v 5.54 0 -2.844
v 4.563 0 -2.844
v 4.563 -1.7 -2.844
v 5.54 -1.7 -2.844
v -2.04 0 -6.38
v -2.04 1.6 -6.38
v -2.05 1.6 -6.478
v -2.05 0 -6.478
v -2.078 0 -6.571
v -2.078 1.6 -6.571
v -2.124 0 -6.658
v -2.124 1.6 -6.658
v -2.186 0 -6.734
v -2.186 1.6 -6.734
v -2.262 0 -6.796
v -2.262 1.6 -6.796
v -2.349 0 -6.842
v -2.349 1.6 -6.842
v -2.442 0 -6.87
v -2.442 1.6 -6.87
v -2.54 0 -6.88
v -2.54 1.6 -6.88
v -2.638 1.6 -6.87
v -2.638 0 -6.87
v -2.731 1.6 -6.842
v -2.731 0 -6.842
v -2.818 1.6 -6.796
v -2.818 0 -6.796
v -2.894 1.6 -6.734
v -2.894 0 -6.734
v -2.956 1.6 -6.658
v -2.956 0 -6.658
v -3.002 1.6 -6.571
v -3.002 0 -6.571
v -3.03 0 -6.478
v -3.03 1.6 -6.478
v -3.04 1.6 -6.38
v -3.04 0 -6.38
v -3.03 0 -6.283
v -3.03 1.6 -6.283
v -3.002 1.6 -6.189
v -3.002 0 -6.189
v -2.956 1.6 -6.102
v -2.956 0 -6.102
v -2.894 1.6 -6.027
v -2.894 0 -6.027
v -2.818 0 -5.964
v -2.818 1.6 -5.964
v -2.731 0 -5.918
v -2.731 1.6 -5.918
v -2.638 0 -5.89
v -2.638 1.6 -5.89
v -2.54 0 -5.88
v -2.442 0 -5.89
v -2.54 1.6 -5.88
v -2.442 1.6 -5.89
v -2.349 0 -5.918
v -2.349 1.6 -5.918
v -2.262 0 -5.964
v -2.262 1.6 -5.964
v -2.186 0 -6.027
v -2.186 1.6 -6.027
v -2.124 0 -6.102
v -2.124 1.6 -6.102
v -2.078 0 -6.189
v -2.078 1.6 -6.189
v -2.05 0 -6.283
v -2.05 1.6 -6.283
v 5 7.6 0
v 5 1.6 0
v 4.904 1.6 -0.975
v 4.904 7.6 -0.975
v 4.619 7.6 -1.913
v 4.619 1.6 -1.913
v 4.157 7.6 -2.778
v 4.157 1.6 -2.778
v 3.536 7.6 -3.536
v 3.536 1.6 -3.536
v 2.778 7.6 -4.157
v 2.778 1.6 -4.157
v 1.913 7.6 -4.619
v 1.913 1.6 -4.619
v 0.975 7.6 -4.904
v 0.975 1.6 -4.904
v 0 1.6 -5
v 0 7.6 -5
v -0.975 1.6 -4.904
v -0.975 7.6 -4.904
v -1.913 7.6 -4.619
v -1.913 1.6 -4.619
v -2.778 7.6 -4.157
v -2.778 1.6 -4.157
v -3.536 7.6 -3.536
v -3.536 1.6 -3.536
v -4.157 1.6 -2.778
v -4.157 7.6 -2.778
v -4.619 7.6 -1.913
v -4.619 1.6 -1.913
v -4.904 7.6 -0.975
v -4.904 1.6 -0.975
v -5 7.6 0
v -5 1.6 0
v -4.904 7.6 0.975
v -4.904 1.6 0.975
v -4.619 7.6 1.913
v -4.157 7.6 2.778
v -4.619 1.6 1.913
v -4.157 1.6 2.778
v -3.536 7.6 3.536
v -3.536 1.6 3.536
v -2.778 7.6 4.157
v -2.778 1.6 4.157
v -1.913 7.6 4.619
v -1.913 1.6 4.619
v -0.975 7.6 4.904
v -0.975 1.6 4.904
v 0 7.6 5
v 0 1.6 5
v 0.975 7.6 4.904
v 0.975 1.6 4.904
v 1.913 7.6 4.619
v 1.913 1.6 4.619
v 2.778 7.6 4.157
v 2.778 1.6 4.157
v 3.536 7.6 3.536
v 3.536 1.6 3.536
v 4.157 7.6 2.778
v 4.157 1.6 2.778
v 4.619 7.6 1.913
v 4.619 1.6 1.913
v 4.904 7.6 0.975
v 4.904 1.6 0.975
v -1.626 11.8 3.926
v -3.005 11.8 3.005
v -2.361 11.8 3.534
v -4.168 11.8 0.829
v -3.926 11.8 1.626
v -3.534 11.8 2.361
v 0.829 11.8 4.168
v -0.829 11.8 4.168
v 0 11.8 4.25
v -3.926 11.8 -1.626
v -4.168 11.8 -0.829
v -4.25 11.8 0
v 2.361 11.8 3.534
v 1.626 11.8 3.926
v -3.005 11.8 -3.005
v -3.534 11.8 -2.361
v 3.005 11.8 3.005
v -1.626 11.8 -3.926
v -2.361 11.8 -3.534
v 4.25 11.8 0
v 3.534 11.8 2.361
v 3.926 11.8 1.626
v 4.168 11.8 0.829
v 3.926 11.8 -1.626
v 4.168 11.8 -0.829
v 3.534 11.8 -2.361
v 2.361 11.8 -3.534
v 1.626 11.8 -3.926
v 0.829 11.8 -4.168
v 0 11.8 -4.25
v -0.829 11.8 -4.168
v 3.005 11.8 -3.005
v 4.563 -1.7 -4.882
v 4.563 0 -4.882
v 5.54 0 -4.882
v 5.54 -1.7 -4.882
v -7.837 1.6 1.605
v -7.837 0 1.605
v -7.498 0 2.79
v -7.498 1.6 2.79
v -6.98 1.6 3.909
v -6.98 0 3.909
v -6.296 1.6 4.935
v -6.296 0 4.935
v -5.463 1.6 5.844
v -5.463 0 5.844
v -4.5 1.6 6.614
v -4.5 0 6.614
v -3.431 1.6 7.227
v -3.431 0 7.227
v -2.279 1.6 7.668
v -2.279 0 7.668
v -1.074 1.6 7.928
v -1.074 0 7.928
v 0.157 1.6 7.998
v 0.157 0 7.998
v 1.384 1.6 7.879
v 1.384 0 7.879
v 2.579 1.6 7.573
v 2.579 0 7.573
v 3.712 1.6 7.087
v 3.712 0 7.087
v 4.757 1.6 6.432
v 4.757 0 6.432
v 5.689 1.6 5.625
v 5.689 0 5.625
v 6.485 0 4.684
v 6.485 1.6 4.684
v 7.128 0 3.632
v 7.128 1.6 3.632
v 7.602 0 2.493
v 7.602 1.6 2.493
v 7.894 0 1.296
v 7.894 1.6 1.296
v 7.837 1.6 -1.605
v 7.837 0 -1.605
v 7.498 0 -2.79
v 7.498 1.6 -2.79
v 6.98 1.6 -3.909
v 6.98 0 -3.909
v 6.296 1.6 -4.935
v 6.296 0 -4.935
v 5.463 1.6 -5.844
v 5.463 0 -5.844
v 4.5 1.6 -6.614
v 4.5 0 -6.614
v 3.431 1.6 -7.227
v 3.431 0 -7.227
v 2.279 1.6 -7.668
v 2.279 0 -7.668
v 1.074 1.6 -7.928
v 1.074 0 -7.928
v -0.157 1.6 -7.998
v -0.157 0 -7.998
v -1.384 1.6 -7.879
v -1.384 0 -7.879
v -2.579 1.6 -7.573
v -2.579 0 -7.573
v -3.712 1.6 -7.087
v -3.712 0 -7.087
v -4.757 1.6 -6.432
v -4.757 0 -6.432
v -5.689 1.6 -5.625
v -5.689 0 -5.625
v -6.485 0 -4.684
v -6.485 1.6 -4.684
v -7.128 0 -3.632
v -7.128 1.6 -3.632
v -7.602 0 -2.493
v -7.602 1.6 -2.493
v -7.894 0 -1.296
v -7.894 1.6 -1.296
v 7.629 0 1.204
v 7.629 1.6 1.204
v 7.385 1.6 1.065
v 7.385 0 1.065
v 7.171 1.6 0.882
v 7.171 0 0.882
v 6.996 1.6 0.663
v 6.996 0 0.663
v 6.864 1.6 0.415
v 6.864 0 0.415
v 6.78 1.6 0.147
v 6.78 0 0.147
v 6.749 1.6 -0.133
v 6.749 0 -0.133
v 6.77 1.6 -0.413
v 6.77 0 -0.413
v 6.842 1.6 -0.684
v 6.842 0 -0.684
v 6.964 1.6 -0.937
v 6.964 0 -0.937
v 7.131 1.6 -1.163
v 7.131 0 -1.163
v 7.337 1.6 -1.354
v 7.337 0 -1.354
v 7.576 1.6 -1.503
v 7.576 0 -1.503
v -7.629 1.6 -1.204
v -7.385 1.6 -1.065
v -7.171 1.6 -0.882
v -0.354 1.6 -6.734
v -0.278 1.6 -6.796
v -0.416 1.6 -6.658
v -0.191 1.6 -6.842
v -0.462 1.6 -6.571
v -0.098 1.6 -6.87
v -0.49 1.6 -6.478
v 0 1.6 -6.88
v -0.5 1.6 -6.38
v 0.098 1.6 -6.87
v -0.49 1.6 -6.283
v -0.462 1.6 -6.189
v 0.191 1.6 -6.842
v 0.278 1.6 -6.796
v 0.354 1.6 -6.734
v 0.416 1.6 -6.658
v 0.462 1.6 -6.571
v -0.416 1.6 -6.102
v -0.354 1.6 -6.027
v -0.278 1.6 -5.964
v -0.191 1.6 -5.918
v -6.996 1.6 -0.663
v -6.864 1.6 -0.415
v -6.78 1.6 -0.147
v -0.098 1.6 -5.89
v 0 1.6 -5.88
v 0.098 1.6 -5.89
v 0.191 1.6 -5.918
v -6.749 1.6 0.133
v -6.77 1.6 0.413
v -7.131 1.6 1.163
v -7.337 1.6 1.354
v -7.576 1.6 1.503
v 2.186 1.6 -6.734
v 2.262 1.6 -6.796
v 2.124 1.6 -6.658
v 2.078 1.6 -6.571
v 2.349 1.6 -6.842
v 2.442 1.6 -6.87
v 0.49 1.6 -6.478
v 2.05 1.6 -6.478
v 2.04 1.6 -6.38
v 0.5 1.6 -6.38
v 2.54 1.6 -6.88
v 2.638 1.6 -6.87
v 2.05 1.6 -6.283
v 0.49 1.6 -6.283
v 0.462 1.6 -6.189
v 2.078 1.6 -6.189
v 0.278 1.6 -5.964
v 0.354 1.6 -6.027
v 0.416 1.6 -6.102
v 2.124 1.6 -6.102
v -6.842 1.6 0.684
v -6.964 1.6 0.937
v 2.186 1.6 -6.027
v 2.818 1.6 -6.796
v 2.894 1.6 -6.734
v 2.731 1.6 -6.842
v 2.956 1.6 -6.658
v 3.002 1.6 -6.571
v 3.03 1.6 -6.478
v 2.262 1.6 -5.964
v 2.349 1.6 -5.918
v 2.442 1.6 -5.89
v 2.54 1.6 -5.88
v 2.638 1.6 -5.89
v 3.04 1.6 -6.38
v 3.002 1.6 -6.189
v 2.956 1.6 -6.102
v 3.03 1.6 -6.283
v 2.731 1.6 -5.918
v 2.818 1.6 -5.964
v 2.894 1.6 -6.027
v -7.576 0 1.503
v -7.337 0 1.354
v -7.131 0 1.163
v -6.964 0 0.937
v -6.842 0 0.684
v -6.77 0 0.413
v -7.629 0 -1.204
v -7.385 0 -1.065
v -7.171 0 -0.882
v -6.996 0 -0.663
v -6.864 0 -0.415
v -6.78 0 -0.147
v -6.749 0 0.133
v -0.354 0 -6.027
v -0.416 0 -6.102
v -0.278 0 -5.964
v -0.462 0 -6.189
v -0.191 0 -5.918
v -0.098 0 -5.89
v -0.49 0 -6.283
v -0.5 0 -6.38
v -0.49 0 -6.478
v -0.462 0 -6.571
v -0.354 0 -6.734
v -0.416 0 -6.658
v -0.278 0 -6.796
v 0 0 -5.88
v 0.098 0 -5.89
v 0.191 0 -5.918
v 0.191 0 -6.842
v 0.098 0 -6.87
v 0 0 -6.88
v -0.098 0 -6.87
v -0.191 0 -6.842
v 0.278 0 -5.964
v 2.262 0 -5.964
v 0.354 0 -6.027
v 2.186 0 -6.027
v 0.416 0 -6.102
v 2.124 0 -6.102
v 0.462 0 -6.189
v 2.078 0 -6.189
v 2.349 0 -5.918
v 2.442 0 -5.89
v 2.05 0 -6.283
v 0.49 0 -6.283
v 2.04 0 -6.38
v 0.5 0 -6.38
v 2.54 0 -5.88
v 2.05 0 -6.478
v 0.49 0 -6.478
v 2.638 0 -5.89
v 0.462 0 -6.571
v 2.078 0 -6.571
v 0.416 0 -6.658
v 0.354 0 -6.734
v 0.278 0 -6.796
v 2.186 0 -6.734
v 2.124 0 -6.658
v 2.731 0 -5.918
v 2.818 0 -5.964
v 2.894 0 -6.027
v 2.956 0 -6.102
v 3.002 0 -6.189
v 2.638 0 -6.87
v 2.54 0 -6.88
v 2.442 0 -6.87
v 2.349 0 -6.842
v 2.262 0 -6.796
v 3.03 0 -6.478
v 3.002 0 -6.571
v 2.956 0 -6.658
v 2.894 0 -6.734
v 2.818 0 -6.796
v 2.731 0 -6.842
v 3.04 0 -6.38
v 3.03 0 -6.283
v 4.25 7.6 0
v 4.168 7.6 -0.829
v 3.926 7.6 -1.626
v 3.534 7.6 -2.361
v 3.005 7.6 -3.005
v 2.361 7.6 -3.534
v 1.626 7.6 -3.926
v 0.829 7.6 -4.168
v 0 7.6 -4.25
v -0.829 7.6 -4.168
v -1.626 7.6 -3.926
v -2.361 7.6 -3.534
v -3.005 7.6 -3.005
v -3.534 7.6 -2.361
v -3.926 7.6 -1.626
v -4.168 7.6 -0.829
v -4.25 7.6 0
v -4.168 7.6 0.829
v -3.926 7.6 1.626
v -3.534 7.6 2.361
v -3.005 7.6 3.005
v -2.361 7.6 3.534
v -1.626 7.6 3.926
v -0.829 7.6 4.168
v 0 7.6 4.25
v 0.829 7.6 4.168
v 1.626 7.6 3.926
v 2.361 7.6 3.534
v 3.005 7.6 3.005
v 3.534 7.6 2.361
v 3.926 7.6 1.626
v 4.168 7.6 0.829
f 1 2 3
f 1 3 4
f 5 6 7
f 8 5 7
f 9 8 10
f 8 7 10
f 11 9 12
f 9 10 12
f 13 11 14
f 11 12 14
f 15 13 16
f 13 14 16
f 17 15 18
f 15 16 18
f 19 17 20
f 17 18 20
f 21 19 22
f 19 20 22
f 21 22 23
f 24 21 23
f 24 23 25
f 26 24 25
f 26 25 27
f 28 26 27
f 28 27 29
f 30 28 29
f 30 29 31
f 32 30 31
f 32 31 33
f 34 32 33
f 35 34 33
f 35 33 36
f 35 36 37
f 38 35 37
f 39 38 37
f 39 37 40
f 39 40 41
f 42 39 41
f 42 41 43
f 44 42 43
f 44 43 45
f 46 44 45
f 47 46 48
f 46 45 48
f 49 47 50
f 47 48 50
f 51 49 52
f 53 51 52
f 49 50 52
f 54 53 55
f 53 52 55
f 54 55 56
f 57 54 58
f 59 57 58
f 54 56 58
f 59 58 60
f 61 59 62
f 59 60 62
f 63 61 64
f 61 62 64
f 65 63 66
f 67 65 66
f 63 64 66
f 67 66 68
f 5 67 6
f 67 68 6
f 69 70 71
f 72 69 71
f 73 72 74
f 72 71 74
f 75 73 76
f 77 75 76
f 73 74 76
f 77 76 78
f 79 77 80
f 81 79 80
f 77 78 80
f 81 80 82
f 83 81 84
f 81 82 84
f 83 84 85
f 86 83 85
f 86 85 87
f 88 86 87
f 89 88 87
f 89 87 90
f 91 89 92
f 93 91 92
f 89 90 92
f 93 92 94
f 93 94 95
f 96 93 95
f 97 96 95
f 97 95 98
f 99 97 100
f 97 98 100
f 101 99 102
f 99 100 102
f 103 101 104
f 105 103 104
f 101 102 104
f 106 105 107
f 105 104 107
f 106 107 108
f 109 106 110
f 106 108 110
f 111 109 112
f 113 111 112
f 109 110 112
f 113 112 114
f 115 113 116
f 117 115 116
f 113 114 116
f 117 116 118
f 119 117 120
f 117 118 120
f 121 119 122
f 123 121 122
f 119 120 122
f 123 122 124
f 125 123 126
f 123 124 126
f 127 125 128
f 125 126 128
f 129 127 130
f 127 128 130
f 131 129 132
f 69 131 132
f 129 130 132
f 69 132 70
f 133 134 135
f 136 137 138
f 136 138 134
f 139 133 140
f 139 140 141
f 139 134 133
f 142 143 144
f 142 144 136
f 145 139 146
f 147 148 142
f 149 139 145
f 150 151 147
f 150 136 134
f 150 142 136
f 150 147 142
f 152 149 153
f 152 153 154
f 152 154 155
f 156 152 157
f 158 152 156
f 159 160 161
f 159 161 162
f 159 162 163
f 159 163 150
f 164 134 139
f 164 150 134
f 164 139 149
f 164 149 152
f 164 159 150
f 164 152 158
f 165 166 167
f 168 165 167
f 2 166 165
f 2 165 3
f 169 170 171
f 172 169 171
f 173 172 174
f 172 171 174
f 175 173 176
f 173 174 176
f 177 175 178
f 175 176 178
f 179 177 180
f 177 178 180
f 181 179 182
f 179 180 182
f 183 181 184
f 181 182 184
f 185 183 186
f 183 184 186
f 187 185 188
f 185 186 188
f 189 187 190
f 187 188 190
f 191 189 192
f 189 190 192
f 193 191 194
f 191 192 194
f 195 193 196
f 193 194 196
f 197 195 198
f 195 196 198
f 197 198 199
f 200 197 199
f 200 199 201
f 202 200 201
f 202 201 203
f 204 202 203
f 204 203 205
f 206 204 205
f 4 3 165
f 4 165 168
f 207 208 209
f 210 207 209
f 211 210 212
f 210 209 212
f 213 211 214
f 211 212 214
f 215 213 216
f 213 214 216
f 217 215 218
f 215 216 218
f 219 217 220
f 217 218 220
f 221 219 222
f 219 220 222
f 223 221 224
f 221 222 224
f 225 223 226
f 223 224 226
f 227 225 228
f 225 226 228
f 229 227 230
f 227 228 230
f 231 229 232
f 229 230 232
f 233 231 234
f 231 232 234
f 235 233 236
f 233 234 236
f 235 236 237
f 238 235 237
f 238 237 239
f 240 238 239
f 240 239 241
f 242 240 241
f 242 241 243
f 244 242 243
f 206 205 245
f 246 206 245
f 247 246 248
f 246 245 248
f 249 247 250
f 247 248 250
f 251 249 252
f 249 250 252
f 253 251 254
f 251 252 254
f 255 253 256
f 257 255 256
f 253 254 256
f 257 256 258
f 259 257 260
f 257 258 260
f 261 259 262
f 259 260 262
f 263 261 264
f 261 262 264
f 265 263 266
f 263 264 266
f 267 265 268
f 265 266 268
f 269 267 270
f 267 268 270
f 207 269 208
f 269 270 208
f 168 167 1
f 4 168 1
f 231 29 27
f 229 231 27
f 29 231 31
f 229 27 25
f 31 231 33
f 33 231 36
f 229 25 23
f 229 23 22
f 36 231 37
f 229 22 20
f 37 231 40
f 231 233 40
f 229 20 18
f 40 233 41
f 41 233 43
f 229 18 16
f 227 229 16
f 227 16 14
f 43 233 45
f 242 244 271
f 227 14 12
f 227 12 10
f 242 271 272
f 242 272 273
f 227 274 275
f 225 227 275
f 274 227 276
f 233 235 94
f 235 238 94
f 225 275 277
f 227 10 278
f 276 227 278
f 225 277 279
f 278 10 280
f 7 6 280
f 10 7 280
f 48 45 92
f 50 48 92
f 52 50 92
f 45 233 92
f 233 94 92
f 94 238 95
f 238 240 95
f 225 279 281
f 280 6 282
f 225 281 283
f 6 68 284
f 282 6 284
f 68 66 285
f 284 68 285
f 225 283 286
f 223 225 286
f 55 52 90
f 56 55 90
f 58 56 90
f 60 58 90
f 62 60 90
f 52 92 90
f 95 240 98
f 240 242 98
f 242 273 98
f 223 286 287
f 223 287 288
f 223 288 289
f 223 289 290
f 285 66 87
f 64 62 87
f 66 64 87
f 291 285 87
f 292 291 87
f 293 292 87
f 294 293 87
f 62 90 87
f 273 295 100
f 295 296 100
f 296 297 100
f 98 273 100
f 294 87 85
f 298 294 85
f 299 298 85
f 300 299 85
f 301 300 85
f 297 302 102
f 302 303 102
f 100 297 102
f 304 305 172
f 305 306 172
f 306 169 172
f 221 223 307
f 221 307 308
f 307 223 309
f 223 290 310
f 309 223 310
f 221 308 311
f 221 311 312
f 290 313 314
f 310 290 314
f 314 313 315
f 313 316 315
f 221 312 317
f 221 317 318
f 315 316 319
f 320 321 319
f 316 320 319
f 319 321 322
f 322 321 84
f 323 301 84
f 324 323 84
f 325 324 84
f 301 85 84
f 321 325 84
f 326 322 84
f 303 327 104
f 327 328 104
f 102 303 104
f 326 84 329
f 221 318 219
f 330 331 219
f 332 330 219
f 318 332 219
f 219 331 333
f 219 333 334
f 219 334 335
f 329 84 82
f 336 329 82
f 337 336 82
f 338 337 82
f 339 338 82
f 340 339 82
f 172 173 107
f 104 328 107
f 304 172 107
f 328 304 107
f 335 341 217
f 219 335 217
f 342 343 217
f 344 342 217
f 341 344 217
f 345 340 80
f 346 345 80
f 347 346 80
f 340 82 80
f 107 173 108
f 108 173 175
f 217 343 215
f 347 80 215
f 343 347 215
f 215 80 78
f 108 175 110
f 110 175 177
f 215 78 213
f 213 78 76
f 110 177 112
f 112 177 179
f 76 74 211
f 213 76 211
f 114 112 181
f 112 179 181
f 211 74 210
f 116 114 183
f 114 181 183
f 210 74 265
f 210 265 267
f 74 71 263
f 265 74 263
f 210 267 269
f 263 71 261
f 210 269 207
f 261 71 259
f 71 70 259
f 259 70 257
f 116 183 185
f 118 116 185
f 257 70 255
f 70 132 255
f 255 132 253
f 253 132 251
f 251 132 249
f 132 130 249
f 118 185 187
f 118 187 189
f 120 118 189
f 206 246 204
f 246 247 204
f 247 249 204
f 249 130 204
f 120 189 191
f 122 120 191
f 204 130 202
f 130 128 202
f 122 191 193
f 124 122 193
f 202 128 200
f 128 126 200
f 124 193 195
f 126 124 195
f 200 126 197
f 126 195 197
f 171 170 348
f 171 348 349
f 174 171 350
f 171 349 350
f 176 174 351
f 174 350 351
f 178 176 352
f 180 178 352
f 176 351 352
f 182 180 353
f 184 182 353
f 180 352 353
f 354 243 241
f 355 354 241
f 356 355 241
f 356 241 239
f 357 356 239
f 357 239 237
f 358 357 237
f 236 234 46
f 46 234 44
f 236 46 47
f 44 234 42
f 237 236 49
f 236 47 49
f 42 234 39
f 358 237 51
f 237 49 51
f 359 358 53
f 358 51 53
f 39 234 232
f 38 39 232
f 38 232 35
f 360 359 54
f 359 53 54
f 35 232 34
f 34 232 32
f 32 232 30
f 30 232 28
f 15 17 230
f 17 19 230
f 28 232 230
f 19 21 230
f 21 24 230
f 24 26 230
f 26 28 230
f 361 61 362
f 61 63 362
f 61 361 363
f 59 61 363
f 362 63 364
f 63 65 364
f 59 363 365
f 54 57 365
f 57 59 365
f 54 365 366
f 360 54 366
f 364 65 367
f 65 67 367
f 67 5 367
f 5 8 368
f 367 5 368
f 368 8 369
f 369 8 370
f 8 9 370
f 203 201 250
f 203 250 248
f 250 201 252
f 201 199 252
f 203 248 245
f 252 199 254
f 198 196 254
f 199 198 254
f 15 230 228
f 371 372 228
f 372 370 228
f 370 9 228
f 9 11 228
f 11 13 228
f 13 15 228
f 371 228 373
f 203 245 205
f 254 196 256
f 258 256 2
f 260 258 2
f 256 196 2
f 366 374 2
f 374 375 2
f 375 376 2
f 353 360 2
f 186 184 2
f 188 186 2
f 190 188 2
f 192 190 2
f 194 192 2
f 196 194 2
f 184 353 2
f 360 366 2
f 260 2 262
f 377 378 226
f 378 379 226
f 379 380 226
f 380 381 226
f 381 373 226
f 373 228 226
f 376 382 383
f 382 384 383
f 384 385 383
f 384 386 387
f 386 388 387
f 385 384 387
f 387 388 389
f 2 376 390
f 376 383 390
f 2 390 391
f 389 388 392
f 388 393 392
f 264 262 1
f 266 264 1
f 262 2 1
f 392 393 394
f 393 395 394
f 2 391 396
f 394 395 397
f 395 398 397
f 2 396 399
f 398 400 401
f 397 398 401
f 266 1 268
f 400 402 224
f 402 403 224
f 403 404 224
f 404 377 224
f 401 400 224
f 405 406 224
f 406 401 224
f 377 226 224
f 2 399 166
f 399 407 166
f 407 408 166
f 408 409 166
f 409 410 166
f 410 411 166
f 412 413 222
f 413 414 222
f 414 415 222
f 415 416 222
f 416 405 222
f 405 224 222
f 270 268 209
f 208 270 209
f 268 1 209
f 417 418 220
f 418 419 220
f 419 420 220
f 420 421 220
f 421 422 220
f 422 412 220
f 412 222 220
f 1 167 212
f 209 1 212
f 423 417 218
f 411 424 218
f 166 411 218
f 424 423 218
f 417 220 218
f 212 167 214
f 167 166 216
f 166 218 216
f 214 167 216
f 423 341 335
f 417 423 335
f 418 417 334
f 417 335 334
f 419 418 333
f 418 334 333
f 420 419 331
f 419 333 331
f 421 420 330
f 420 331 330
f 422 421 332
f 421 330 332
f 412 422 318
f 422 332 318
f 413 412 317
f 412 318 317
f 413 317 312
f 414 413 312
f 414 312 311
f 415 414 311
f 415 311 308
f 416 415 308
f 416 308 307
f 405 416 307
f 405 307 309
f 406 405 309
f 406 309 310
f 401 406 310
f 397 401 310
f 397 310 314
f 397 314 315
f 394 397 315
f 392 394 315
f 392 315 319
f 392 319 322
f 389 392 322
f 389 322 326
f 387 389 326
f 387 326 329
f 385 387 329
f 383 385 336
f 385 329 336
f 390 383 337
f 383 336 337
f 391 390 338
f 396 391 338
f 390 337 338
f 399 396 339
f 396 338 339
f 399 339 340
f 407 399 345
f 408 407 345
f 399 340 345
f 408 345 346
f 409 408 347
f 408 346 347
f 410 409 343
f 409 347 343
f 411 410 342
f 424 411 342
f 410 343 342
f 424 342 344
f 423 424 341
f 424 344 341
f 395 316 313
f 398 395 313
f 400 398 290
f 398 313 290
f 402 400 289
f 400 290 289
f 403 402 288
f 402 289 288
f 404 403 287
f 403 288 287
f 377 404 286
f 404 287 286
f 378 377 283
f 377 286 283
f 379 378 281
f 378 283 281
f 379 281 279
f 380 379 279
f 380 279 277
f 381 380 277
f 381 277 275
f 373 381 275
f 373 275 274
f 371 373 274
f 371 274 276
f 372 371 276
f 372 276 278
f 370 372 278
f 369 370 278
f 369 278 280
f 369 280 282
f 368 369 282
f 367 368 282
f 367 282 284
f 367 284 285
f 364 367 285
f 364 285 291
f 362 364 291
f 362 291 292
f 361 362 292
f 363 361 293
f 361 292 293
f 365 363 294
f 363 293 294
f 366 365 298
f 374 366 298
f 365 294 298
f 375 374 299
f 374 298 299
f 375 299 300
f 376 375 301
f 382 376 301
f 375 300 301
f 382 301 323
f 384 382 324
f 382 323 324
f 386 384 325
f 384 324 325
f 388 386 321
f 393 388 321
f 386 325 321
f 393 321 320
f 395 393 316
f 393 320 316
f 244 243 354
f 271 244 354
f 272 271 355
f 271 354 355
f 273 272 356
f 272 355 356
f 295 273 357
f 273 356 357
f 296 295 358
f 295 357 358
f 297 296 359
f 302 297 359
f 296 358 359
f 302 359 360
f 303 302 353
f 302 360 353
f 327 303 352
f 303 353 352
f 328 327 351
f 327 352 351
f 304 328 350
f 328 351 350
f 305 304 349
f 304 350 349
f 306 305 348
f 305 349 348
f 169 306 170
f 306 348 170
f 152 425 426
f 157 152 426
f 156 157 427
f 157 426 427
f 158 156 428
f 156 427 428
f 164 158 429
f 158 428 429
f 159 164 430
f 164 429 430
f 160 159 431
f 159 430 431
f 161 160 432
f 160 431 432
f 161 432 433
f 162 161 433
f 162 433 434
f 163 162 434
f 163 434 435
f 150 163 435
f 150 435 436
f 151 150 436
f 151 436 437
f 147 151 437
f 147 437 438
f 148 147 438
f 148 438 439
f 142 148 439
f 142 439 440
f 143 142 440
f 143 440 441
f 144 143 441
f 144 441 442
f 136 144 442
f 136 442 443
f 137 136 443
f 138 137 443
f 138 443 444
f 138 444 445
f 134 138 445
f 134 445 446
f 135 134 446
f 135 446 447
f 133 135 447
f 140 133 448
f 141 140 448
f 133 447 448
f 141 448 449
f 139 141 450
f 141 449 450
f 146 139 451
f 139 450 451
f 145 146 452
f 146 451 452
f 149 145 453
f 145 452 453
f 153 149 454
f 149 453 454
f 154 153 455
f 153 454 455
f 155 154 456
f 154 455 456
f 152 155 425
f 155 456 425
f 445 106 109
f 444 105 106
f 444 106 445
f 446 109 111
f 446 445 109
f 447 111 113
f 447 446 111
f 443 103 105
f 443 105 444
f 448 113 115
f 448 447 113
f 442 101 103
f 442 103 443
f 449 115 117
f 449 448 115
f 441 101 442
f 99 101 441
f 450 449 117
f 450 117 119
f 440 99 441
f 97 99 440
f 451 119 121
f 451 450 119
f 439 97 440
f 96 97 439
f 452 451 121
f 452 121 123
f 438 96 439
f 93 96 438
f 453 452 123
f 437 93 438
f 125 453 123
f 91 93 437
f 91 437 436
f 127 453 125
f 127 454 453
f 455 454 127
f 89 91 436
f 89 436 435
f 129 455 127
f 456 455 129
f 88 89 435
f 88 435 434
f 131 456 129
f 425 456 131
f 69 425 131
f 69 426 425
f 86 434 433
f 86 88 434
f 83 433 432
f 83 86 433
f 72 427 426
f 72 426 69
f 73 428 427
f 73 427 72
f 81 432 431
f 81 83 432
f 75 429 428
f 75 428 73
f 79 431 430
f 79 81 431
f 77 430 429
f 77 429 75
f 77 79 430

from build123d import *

# Parameters (mm, degrees)
EXTRUDE_1_DEPTH     = 1.6
SKETCH_2_R          = 5
EXTRUDE_2_DEPTH     = 6
EXTRUDE_START       = -6
SKETCH_3_R          = 4.25
EXTRUDE_3_DEPTH     = 10.2
SKETCH_4_R          = 0.5
CUT_EXTRUDE_1_DEPTH = 2.6
EXTRUDE_START_2     = -1.6
SKETCH_5_W          = 0.976311431
SKETCH_5_H          = 2.037519509
EXTRUDE_4_DEPTH     = 3.3


with BuildPart() as part:
    # 草图1 → 凸台-拉伸1 (new body)
    with BuildSketch(Plane(origin=(0, 0, 0), x_dir=(1, 0, 0), z_dir=(0, 1, 0))):
        with BuildLine():
            ThreePointArc((7.894379623, -1.295673712), (6.748699348, 0.13250325), (7.837436926, 1.604550536))
            ThreePointArc((7.837436926, 1.604550536), (-0.157040889, 7.998458486), (-7.894379623, 1.295673712))
            ThreePointArc((-7.894379623, 1.295673712), (-6.748699348, -0.13250325), (-7.837436926, -1.604550536))
            ThreePointArc((-7.837436926, -1.604550536), (0.157040889, -7.998458486), (7.894379623, -1.295673712))
        make_face()
    extrude(amount=EXTRUDE_1_DEPTH)

    # 草图2 → 凸台-拉伸2 (add)
    with BuildSketch(Plane(origin=(0, 1.6, 0), x_dir=(1, 0, 0), z_dir=(0, 1, 0))):
        Circle(SKETCH_2_R)
    extrude(amount=EXTRUDE_2_DEPTH)

    # 草图3 → 凸台-拉伸3 (add)
    with BuildSketch(Plane(origin=(0, 7.6, 0), x_dir=(1, 0, 0), z_dir=(0, 1, 0)).offset(EXTRUDE_START)):
        Circle(SKETCH_3_R)
    extrude(amount=EXTRUDE_3_DEPTH)

    # 草图4 → 切除-拉伸1 (cut, through all)
    with BuildSketch(Plane(origin=(0, 1.6, 0), x_dir=(1, 0, 0), z_dir=(0, 1, 0))):
        with Locations((-2.54, 6.380087041)):
            Circle(SKETCH_4_R)
        with Locations((0, 6.380087041)):
            Circle(SKETCH_4_R)
        with Locations((2.54, 6.380087041)):
            Circle(SKETCH_4_R)
    extrude(amount=-CUT_EXTRUDE_1_DEPTH, mode=Mode.SUBTRACT)

    # 草图5 → 凸台-拉伸4 (add)
    with BuildSketch(Plane.XZ.offset(EXTRUDE_START_2)):
        with Locations((5.05135045, -3.862797403)):
            Rectangle(SKETCH_5_W, SKETCH_5_H)
    extrude(amount=EXTRUDE_4_DEPTH)


solid = part.part
